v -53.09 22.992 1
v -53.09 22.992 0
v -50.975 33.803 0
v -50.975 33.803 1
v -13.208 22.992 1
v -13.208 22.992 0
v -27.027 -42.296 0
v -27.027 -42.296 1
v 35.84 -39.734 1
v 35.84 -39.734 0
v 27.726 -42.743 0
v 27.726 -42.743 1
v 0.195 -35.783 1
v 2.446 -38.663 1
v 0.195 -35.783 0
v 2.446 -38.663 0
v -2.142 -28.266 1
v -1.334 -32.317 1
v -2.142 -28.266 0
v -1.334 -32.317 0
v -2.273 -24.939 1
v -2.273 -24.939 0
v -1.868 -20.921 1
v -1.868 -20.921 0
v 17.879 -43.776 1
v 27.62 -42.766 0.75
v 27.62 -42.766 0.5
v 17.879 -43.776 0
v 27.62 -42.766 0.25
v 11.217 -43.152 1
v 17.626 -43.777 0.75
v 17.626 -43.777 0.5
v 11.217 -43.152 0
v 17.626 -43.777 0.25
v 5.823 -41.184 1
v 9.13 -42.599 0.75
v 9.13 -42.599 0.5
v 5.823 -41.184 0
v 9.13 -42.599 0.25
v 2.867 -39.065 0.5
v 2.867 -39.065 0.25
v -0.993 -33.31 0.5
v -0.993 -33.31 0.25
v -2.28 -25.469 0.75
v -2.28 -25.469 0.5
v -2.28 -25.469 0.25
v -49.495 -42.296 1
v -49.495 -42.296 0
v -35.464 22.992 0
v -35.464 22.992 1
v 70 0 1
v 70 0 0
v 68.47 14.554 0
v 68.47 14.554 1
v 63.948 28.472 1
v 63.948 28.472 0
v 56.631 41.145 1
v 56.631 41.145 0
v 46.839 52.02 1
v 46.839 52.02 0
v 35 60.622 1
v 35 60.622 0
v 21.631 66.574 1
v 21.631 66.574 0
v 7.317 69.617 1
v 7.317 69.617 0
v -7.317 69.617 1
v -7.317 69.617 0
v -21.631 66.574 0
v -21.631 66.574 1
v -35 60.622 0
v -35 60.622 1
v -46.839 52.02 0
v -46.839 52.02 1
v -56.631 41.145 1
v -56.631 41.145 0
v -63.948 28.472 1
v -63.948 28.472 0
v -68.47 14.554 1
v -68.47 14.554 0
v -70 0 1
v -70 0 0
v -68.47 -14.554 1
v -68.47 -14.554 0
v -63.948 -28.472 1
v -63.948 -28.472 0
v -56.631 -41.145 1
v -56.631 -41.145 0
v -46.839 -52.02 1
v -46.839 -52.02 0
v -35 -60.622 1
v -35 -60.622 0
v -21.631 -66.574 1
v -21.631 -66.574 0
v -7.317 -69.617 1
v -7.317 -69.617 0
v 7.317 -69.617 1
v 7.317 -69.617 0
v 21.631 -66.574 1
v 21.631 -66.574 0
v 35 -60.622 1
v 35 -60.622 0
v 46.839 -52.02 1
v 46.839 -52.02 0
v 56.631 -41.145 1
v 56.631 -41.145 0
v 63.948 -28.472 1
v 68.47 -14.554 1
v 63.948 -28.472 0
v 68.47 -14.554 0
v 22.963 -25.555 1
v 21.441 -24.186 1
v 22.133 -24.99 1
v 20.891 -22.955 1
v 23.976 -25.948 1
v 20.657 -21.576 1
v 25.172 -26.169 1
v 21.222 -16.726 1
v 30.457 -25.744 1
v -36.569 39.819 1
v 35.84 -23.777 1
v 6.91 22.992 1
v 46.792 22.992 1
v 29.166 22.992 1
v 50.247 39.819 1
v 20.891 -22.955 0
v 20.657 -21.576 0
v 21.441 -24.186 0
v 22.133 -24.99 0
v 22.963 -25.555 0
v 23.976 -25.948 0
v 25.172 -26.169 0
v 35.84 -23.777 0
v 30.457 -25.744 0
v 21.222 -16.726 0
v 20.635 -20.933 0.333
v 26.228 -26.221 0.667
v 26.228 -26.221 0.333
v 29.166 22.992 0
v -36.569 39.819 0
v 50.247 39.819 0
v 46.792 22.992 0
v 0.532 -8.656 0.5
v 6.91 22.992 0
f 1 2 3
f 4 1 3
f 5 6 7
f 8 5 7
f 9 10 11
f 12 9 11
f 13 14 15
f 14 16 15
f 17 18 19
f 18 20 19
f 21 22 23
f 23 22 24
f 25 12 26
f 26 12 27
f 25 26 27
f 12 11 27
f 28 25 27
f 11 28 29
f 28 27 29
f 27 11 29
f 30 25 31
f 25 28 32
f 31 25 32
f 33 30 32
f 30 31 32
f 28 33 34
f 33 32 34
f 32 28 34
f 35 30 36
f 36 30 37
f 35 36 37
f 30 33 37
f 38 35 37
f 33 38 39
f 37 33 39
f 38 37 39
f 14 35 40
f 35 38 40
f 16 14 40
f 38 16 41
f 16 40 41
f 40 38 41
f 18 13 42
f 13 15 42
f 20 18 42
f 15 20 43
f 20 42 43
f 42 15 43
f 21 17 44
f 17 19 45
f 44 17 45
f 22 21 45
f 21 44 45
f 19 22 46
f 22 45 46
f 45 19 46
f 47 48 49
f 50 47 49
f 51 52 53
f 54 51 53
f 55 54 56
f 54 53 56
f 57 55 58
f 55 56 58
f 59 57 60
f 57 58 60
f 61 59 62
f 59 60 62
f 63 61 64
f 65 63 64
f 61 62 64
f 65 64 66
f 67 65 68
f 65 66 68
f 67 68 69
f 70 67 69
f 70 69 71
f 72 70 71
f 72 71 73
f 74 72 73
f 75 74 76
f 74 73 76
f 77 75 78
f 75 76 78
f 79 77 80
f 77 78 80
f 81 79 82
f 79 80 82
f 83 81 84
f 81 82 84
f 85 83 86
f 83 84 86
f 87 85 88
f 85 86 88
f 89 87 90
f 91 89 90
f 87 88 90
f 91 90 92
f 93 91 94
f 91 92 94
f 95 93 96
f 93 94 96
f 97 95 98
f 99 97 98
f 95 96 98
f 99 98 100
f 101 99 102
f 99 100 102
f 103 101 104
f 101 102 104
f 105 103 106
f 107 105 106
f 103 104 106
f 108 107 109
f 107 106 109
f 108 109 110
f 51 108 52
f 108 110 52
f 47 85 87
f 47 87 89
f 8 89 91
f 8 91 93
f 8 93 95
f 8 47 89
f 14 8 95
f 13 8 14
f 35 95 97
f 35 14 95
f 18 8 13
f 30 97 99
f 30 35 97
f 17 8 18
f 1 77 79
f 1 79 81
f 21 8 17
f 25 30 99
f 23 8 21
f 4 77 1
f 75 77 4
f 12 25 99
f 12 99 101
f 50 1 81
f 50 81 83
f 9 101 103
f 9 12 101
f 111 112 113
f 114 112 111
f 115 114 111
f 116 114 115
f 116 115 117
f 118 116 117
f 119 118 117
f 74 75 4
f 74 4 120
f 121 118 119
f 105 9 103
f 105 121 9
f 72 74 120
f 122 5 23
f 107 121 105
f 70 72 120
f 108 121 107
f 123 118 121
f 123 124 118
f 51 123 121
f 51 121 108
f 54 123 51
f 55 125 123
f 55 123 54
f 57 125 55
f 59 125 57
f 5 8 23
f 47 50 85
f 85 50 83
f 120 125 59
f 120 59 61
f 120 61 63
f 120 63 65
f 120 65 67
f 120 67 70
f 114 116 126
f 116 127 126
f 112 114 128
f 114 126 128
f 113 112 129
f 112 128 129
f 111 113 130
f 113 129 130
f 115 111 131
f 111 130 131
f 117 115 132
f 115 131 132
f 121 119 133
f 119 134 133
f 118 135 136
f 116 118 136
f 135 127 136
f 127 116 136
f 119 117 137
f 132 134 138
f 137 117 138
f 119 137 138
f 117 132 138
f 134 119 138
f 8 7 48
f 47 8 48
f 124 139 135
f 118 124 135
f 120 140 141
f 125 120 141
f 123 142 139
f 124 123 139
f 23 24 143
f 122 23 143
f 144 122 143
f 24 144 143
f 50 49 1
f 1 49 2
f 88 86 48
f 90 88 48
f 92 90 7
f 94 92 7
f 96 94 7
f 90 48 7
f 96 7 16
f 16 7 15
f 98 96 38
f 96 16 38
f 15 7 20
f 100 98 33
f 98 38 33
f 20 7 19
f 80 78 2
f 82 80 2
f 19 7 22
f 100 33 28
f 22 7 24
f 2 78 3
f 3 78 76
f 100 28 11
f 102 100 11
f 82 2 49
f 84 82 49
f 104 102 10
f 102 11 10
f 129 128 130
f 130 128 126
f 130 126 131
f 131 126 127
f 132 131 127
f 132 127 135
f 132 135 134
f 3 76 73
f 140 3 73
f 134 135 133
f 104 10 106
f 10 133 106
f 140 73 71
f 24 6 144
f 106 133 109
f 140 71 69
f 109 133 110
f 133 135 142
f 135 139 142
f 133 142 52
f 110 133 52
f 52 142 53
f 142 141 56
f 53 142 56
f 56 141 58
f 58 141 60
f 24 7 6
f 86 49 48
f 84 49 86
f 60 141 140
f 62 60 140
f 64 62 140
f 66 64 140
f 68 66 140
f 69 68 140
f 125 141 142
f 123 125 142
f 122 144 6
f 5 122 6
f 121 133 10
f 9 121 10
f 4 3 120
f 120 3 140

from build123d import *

# Parameters (mm, degrees)
F0_R     = 70
F1_DEPTH = 1


with BuildPart() as f1:
    # F0 (on Top) → F1 (new body)
    with BuildSketch(Plane.XY):
        Circle(F0_R)
        with BuildLine():
            add(Edge.make_bspline(
                [(20.6345475911, -20.9330199765), (20.6345475911, -26.2209165687), (26.2279670975, -26.2209165687)],
                knots=[0, 0, 0, 1, 1, 1], degree=2))
            add(Edge.make_bspline(
                [(26.2279670975, -26.2209165687), (30.9988249119, -26.2209165687), (35.8401880141, -23.776733255)],
                knots=[0, 0, 0, 1, 1, 1], degree=2))
            Line((35.8401880141, -23.776733255), (35.8401880141, -39.7344300823))
            add(Edge.make_bspline(
                [(35.8401880141, -39.7344300823), (28.5076380729, -43.776733255), (17.6263219741, -43.776733255)],
                knots=[0, 0, 0, 1, 1, 1], degree=2))
            add(Edge.make_bspline(
                [(17.6263219741, -43.776733255), (8.0141010576, -43.776733255), (2.8672150411, -39.0646298472)],
                knots=[0, 0, 0, 1, 1, 1], degree=2))
            add(Edge.make_bspline(
                [(2.8672150411, -39.0646298472), (-2.2796709753, -34.3525264395), (-2.2796709753, -25.4688601645)],
                knots=[0, 0, 0, 1, 1, 1], degree=2))
            add(Edge.make_bspline(
                [(-2.2796709753, -25.4688601645), (-2.2796709753, -23.4947121034), (-1.8683901293, -20.9212690952)],
                knots=[0, 0, 0, 1, 1, 1], degree=2))
            add(Edge.make_bspline(
                [(-1.8683901293, -20.9212690952), (-1.4571092832, -18.347826087), (6.9095182139, 22.9917743831)],
                knots=[0, 0, 0, 1, 1, 1], degree=2))
            Line((6.9095182139, 22.9917743831), (-13.2079905993, 22.9917743831))
            Line((-13.2079905993, 22.9917743831), (-27.027027027, -42.2961222092))
            Line((-27.027027027, -42.2961222092), (-49.4947121034, -42.2961222092))
            Line((-49.4947121034, -42.2961222092), (-35.464159812, 22.9917743831))
            Line((-35.464159812, 22.9917743831), (-53.0904817861, 22.9917743831))
            Line((-53.0904817861, 22.9917743831), (-50.9753231492, 33.8025851939))
            Line((-50.9753231492, 33.8025851939), (-36.5687426557, 39.8190364277))
            Line((-36.5687426557, 39.8190364277), (50.2467685076, 39.8190364277))
            Line((50.2467685076, 39.8190364277), (46.7920094007, 22.9917743831))
            Line((46.7920094007, 22.9917743831), (29.1656874266, 22.9917743831))
            Line((29.1656874266, 22.9917743831), (21.2220916569, -16.7262044653))
            add(Edge.make_bspline(
                [(21.2220916569, -16.7262044653), (20.6345475911, -19.6639247944), (20.6345475911, -20.9330199765)],
                knots=[0, 0, 0, 1, 1, 1], degree=2))
        make_face(mode=Mode.SUBTRACT)
    extrude(amount=F1_DEPTH)


solid = f1.part
